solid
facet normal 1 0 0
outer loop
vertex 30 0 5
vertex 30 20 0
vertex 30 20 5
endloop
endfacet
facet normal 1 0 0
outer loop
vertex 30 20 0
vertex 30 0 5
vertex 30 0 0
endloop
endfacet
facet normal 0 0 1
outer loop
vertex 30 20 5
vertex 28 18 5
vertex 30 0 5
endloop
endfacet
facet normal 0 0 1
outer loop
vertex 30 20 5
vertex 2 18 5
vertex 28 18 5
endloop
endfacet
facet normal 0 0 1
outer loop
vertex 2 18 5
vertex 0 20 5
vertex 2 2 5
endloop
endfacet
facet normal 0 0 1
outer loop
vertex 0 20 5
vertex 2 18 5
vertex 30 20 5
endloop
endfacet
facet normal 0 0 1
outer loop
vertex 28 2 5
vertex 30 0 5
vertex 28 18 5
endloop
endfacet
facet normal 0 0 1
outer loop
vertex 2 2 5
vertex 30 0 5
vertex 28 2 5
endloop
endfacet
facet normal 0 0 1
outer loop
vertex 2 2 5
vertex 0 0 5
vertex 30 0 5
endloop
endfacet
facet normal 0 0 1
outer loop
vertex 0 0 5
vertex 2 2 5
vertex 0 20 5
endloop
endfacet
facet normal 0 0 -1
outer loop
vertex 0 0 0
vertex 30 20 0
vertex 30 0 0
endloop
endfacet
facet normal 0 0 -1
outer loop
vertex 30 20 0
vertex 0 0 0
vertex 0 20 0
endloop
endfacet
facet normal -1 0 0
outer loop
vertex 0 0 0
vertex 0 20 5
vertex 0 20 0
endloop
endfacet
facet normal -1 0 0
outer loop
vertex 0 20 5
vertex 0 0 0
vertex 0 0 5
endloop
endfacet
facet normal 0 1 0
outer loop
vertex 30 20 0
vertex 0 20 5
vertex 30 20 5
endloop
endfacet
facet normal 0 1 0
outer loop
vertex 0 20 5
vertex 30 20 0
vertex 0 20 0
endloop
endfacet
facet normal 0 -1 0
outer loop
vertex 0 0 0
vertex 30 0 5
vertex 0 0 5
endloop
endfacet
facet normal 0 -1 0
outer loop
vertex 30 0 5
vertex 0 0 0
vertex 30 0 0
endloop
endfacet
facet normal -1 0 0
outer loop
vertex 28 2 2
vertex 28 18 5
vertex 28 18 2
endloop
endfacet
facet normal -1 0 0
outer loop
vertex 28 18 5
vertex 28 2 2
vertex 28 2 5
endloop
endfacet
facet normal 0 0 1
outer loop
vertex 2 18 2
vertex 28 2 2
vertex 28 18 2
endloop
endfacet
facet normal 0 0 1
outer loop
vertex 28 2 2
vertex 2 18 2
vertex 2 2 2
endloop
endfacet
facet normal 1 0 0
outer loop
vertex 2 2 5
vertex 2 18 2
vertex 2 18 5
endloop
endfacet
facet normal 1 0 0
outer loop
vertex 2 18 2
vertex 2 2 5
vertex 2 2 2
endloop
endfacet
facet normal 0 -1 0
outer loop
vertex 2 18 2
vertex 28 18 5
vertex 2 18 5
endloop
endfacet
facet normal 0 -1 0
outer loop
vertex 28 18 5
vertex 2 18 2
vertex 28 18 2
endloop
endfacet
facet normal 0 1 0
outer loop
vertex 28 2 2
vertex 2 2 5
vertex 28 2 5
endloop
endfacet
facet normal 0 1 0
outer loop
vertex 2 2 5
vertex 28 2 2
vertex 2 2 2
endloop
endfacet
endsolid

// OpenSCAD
/*
    A simple parametric box (without cover)

    parameters:
    -size           is a vector [x, y, z]
    -thickness_b    the thickness of the bottom face
    -thickness_w    The thickness of the wall faces
*/

module box (
    size,
    thickness_b = 2,
    thickness_w = 2
) {
    difference() {
        cube([size.x, size.y, size.z]);

        translate(v = [thickness_w, thickness_w, thickness_b]){
            cube([size.x - thickness_w * 2, size.y - thickness_w * 2, size.z]);
        }
    }
}


box([30, 20, 5]);
